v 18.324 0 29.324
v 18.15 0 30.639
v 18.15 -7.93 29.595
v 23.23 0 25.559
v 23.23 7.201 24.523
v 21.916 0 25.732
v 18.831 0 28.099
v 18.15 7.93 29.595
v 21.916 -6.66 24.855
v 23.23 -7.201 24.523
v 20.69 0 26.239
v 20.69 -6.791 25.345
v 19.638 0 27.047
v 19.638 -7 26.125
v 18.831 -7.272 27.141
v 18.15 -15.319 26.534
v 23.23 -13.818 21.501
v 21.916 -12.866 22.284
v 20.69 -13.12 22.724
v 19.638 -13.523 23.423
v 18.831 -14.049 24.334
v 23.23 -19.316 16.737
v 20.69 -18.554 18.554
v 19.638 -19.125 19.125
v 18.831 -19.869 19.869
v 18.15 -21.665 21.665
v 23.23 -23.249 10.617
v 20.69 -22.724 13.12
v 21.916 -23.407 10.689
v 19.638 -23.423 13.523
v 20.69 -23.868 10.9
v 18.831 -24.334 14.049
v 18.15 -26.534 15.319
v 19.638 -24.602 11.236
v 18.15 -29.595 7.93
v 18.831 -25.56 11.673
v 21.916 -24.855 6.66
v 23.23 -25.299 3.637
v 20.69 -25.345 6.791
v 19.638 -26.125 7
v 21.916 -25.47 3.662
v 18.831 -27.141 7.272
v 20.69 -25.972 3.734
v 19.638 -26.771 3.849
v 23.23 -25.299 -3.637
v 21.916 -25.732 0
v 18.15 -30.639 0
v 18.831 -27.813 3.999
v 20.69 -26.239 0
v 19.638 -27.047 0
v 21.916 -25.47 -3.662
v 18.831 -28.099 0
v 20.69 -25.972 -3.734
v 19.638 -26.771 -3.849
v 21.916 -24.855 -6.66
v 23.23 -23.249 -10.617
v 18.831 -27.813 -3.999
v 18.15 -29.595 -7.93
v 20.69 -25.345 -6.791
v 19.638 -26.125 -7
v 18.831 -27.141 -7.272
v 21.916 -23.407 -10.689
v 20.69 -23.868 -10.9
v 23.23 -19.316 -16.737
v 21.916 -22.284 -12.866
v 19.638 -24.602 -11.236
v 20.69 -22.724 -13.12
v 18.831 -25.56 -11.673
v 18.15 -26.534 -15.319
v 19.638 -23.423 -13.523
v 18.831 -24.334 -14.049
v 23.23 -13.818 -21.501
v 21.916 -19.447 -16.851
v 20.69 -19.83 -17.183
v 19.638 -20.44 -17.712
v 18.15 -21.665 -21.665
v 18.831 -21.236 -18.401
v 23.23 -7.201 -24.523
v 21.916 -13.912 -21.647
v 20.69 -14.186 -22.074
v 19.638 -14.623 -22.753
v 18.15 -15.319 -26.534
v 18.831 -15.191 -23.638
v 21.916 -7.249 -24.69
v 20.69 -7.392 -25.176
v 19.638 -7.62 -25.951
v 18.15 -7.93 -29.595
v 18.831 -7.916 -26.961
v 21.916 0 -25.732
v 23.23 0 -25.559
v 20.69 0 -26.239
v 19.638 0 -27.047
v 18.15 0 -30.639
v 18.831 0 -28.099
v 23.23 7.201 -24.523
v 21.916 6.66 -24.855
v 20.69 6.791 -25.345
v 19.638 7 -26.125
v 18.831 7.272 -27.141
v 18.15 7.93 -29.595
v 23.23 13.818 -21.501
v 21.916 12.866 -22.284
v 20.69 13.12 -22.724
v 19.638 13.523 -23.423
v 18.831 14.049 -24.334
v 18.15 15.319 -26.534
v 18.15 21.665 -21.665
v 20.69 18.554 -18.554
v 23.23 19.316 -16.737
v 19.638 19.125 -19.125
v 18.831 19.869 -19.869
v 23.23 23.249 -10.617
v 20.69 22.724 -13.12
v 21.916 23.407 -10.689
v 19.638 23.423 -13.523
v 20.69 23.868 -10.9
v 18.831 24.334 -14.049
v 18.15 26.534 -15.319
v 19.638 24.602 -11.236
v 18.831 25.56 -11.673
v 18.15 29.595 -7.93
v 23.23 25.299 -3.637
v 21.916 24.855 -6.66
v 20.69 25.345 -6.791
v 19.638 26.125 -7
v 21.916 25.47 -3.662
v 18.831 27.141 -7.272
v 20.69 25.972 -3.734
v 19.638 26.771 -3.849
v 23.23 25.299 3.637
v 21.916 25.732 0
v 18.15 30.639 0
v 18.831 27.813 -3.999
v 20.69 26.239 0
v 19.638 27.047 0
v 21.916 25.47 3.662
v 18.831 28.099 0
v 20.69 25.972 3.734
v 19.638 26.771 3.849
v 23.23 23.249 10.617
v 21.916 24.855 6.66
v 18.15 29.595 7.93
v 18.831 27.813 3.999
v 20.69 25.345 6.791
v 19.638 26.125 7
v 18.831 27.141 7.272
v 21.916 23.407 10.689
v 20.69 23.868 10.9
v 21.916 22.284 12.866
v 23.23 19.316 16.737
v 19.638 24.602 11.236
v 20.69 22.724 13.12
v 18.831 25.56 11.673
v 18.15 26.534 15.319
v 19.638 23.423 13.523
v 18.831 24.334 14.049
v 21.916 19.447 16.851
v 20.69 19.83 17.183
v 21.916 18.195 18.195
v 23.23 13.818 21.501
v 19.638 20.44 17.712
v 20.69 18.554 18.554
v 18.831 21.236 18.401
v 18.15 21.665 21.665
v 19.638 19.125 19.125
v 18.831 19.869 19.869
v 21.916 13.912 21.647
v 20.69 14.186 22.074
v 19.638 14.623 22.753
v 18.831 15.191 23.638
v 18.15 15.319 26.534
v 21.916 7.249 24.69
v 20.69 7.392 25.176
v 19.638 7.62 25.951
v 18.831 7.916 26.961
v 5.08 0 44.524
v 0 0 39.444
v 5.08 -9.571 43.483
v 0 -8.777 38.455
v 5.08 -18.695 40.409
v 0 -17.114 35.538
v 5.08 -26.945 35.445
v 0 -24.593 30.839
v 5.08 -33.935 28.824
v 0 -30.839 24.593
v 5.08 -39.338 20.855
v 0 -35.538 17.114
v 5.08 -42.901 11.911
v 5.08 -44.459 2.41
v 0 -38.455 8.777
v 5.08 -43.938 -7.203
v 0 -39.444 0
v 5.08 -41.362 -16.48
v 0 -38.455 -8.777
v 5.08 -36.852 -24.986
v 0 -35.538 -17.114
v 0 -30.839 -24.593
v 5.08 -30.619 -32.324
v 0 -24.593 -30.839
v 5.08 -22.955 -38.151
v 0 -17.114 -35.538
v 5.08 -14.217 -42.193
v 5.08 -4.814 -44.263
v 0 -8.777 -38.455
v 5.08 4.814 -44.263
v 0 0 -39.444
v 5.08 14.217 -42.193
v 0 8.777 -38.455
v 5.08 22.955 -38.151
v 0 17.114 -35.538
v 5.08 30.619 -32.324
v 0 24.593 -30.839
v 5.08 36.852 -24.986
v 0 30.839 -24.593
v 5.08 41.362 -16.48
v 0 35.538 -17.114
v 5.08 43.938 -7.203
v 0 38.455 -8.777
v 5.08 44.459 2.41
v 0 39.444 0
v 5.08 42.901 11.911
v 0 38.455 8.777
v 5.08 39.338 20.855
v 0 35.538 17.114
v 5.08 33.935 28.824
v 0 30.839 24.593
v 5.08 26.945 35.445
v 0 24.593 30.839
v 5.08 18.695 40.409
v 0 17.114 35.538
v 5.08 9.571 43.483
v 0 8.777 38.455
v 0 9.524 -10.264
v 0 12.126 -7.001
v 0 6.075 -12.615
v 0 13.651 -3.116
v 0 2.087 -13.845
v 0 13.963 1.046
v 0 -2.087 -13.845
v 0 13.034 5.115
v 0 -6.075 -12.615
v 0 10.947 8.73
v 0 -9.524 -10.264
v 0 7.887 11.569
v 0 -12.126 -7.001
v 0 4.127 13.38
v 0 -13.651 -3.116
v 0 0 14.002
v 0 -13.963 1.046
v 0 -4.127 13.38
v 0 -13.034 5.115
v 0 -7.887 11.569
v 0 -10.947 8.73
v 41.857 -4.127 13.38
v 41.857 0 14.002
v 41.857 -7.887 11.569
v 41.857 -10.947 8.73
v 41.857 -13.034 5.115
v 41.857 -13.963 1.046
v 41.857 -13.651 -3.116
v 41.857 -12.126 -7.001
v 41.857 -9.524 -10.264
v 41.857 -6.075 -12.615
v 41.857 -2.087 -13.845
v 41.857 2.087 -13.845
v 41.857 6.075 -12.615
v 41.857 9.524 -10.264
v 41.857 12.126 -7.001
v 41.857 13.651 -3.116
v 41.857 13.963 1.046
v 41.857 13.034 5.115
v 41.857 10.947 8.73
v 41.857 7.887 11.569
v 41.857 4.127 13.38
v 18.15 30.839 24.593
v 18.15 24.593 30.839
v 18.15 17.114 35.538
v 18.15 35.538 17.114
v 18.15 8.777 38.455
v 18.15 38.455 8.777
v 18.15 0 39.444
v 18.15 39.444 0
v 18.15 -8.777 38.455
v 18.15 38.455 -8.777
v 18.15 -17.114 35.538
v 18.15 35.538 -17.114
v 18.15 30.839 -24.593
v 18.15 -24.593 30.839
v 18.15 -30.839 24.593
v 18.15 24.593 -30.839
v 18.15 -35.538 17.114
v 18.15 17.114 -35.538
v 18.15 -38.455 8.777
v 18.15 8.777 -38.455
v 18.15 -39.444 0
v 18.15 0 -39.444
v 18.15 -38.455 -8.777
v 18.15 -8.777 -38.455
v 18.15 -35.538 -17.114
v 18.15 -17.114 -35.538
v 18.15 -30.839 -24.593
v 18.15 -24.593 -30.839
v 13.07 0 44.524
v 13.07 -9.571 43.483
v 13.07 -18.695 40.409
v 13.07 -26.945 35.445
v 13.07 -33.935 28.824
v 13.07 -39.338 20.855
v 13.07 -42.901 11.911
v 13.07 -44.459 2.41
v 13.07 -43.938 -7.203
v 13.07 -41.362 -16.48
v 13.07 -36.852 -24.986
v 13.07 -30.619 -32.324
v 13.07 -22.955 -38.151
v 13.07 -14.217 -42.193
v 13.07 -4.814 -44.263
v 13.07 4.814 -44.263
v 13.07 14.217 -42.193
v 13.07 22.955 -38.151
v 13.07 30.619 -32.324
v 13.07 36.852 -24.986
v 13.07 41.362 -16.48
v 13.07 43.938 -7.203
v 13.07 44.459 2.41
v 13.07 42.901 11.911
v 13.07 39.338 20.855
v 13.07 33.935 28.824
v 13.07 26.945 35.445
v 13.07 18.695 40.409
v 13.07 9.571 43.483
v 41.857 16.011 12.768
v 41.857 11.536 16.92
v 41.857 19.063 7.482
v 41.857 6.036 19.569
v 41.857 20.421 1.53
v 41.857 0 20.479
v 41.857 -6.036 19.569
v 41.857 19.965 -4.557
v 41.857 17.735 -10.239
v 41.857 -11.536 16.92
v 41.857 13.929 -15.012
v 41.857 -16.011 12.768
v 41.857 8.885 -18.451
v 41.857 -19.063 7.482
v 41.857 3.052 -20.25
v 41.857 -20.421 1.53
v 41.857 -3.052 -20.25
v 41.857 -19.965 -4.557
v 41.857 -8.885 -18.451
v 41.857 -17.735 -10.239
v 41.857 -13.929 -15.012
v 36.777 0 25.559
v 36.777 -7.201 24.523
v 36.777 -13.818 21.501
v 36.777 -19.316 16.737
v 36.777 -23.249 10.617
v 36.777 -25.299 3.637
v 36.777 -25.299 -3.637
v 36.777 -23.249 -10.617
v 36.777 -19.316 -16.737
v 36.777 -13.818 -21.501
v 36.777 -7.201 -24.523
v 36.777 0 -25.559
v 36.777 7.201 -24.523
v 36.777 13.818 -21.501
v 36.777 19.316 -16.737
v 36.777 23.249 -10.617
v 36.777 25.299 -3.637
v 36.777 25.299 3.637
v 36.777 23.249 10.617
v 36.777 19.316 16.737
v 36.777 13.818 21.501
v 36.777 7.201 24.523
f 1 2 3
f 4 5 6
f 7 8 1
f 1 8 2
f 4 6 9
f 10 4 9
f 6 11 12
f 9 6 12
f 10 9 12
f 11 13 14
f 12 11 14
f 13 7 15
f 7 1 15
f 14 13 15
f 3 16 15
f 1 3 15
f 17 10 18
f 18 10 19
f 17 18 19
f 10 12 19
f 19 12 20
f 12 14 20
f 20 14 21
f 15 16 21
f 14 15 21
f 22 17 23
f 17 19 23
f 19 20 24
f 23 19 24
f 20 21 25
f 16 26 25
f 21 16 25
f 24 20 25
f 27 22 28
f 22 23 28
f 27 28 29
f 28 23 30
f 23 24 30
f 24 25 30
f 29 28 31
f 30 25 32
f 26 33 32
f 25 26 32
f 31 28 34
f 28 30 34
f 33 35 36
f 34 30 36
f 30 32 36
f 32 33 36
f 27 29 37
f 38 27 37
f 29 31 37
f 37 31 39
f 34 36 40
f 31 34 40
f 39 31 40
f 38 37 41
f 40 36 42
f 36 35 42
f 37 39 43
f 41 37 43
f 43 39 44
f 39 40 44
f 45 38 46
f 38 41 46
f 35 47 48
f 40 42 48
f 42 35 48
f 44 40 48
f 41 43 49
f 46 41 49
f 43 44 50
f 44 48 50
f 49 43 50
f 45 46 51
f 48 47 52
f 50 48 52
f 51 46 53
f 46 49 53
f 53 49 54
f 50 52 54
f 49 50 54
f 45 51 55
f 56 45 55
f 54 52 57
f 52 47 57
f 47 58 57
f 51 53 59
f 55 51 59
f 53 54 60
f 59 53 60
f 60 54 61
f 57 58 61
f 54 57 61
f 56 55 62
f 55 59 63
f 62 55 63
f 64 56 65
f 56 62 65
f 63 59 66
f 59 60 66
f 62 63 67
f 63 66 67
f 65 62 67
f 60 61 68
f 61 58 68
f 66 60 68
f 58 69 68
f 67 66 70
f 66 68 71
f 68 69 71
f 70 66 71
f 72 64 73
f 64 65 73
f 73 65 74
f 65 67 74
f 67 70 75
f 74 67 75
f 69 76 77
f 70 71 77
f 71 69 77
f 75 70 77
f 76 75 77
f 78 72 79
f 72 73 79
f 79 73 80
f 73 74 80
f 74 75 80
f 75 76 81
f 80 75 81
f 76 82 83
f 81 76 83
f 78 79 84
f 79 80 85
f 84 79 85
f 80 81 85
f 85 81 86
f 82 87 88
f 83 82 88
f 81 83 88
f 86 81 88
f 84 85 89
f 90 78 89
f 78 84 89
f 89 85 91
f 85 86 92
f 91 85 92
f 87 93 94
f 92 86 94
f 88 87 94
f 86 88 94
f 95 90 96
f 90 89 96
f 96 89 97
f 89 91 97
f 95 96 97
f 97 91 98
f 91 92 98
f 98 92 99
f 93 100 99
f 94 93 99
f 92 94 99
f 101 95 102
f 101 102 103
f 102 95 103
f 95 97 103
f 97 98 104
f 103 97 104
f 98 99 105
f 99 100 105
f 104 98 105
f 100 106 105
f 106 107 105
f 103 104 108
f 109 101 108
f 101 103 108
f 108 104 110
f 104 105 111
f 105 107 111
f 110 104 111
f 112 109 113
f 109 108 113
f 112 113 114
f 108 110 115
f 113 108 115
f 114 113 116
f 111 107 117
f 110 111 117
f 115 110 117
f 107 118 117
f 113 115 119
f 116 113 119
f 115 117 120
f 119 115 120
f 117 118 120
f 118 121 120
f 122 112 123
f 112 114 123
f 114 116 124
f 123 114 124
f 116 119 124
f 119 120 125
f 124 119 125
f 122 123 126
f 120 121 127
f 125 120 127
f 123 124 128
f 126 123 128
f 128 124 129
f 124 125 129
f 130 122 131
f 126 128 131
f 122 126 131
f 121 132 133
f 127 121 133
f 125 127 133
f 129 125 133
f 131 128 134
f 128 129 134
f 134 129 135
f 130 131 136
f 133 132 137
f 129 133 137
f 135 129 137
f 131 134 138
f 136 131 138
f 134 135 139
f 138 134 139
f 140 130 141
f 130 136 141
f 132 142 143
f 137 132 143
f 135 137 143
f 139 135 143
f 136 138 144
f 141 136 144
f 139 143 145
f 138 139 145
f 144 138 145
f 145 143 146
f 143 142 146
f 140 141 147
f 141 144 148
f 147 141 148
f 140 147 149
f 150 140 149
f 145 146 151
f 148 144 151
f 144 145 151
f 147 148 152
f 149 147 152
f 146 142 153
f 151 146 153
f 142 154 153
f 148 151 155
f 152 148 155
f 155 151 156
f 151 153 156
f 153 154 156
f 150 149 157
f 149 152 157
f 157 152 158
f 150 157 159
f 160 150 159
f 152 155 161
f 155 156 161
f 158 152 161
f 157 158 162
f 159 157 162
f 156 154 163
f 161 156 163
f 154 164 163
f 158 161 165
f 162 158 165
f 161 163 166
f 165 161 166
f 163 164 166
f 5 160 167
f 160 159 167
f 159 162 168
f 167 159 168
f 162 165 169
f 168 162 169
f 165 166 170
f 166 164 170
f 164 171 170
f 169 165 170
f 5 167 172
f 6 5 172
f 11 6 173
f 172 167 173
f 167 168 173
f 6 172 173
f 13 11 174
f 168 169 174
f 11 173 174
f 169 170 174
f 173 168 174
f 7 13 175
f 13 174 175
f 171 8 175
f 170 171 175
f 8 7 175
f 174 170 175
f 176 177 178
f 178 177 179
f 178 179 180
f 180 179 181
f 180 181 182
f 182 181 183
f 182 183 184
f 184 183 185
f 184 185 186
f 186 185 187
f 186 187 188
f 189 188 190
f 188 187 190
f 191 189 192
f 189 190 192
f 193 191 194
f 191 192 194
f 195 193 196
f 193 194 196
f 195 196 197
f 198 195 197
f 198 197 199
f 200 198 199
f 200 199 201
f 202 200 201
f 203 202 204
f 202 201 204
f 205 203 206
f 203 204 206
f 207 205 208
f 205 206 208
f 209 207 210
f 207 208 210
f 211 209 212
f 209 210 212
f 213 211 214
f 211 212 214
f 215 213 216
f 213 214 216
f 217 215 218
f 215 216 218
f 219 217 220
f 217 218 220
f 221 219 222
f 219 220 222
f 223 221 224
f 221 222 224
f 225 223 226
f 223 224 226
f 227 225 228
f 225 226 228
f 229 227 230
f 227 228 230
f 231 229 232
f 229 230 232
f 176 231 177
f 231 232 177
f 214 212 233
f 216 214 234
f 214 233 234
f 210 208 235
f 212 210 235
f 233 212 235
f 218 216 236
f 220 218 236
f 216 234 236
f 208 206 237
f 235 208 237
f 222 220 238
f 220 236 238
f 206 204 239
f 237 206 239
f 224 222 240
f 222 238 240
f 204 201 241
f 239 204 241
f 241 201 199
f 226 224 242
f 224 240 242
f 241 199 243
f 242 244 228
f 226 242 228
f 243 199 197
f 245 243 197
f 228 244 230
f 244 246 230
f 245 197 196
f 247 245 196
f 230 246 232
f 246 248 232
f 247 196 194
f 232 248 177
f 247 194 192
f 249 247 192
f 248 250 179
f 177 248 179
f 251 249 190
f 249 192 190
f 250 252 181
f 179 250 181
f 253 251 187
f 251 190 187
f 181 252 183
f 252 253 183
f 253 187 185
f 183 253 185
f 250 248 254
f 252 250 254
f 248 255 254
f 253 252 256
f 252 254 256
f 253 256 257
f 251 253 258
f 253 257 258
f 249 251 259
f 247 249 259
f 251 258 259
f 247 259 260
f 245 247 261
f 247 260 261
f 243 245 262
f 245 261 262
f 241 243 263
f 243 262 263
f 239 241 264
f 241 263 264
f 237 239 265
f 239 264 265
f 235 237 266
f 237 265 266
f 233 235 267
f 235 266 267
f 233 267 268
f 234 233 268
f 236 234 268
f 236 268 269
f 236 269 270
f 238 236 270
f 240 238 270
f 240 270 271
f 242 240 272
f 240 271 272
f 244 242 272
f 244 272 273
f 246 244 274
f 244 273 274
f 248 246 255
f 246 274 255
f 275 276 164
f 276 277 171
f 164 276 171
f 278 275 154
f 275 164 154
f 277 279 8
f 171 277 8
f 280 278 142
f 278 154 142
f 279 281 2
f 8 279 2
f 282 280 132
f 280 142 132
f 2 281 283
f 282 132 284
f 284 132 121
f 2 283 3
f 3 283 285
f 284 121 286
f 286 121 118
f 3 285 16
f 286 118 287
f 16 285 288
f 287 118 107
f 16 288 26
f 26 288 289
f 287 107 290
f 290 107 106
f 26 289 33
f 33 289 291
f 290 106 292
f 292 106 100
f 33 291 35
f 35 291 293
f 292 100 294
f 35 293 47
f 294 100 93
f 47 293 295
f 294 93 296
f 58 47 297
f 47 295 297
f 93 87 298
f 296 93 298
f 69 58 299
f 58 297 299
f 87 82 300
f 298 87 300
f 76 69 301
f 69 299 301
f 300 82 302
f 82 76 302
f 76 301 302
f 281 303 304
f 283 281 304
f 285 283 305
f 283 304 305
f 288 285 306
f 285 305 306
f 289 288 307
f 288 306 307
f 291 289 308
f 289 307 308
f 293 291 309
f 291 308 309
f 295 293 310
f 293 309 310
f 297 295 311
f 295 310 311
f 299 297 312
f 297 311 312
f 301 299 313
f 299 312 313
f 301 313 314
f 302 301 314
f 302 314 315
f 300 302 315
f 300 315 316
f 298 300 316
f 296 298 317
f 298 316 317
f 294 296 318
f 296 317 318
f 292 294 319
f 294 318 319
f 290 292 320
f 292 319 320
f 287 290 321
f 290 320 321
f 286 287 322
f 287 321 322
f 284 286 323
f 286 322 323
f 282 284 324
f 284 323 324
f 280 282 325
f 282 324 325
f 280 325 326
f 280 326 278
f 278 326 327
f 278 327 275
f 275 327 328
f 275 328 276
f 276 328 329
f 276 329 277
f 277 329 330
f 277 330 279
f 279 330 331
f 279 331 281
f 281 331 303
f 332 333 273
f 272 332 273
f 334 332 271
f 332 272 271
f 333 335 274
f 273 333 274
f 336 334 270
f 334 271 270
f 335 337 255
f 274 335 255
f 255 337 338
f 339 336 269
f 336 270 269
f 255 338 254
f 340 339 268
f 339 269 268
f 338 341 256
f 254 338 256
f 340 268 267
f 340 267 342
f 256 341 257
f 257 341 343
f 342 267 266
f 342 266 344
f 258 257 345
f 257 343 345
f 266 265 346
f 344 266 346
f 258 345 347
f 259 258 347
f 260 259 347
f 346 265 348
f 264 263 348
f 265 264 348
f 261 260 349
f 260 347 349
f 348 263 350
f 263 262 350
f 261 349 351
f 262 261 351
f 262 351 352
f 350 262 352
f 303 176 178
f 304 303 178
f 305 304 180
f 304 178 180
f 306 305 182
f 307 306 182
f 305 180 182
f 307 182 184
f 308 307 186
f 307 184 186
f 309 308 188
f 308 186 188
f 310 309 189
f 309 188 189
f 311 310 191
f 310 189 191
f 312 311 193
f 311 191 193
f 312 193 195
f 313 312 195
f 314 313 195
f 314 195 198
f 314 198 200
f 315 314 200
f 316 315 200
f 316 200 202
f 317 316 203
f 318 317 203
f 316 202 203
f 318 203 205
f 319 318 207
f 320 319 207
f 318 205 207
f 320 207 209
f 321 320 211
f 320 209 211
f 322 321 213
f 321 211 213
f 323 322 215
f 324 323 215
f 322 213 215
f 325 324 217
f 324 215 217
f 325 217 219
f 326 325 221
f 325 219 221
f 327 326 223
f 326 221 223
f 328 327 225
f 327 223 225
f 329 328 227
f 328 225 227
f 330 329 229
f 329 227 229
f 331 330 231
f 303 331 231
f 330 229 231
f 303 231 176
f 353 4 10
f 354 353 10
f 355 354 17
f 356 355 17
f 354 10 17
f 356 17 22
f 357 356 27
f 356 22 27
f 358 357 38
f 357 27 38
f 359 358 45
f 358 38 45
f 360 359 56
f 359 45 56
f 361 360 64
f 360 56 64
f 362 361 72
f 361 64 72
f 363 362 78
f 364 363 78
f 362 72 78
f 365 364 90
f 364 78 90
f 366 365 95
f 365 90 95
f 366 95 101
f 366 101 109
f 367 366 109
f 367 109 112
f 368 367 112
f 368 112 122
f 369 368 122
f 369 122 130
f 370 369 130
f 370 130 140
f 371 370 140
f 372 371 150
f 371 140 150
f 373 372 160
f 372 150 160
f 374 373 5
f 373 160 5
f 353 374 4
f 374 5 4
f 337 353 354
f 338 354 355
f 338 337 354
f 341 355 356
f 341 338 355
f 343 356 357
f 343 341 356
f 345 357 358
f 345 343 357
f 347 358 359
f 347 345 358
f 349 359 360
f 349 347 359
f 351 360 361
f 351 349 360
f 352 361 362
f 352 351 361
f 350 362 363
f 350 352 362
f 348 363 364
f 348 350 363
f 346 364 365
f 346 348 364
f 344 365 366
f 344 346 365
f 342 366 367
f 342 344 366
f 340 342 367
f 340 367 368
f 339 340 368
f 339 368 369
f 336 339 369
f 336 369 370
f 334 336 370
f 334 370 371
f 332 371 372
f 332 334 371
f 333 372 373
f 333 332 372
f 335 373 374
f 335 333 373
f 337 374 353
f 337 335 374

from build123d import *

# Parameters (mm, degrees)
F2_R    = 5.08
F3_SIZE = 5.08


# Not quite as in the source:
# - the program builds the solid bodies; features that only make, move or delete a surface that nothing else refers to are left out


with BuildPart() as f1:
    # F0 (on Front) → F1 (revolve)
    with BuildSketch(Plane.XZ):
        Polygon((18.1504152715, 44.5240847766), (0, 44.5240847766), (0, 14.0017503873), (41.8570823967, 14.0017503873), (41.8570823967, 25.5587510765), (18.1504152715, 25.5587510765), align=None)
    revolve(axis=Axis((21.6693747789, 0, 0), (1, 0, 0)))

    # F2
    f2_edges = [f1.edges().sort_by_distance(p)[0] for p in [
        (18.150415, 0, -25.558751),
    ]]
    fillet(f2_edges, radius=F2_R)

    # F3
    f3_edges = [f1.edges().sort_by_distance(p)[0] for p in [
        (41.857082, 0, -25.558751),
        (18.150415, 0, -44.524085),
        (0, 0, -44.524085),
    ]]
    chamfer(f3_edges, length=F3_SIZE)


solid = f1.part
